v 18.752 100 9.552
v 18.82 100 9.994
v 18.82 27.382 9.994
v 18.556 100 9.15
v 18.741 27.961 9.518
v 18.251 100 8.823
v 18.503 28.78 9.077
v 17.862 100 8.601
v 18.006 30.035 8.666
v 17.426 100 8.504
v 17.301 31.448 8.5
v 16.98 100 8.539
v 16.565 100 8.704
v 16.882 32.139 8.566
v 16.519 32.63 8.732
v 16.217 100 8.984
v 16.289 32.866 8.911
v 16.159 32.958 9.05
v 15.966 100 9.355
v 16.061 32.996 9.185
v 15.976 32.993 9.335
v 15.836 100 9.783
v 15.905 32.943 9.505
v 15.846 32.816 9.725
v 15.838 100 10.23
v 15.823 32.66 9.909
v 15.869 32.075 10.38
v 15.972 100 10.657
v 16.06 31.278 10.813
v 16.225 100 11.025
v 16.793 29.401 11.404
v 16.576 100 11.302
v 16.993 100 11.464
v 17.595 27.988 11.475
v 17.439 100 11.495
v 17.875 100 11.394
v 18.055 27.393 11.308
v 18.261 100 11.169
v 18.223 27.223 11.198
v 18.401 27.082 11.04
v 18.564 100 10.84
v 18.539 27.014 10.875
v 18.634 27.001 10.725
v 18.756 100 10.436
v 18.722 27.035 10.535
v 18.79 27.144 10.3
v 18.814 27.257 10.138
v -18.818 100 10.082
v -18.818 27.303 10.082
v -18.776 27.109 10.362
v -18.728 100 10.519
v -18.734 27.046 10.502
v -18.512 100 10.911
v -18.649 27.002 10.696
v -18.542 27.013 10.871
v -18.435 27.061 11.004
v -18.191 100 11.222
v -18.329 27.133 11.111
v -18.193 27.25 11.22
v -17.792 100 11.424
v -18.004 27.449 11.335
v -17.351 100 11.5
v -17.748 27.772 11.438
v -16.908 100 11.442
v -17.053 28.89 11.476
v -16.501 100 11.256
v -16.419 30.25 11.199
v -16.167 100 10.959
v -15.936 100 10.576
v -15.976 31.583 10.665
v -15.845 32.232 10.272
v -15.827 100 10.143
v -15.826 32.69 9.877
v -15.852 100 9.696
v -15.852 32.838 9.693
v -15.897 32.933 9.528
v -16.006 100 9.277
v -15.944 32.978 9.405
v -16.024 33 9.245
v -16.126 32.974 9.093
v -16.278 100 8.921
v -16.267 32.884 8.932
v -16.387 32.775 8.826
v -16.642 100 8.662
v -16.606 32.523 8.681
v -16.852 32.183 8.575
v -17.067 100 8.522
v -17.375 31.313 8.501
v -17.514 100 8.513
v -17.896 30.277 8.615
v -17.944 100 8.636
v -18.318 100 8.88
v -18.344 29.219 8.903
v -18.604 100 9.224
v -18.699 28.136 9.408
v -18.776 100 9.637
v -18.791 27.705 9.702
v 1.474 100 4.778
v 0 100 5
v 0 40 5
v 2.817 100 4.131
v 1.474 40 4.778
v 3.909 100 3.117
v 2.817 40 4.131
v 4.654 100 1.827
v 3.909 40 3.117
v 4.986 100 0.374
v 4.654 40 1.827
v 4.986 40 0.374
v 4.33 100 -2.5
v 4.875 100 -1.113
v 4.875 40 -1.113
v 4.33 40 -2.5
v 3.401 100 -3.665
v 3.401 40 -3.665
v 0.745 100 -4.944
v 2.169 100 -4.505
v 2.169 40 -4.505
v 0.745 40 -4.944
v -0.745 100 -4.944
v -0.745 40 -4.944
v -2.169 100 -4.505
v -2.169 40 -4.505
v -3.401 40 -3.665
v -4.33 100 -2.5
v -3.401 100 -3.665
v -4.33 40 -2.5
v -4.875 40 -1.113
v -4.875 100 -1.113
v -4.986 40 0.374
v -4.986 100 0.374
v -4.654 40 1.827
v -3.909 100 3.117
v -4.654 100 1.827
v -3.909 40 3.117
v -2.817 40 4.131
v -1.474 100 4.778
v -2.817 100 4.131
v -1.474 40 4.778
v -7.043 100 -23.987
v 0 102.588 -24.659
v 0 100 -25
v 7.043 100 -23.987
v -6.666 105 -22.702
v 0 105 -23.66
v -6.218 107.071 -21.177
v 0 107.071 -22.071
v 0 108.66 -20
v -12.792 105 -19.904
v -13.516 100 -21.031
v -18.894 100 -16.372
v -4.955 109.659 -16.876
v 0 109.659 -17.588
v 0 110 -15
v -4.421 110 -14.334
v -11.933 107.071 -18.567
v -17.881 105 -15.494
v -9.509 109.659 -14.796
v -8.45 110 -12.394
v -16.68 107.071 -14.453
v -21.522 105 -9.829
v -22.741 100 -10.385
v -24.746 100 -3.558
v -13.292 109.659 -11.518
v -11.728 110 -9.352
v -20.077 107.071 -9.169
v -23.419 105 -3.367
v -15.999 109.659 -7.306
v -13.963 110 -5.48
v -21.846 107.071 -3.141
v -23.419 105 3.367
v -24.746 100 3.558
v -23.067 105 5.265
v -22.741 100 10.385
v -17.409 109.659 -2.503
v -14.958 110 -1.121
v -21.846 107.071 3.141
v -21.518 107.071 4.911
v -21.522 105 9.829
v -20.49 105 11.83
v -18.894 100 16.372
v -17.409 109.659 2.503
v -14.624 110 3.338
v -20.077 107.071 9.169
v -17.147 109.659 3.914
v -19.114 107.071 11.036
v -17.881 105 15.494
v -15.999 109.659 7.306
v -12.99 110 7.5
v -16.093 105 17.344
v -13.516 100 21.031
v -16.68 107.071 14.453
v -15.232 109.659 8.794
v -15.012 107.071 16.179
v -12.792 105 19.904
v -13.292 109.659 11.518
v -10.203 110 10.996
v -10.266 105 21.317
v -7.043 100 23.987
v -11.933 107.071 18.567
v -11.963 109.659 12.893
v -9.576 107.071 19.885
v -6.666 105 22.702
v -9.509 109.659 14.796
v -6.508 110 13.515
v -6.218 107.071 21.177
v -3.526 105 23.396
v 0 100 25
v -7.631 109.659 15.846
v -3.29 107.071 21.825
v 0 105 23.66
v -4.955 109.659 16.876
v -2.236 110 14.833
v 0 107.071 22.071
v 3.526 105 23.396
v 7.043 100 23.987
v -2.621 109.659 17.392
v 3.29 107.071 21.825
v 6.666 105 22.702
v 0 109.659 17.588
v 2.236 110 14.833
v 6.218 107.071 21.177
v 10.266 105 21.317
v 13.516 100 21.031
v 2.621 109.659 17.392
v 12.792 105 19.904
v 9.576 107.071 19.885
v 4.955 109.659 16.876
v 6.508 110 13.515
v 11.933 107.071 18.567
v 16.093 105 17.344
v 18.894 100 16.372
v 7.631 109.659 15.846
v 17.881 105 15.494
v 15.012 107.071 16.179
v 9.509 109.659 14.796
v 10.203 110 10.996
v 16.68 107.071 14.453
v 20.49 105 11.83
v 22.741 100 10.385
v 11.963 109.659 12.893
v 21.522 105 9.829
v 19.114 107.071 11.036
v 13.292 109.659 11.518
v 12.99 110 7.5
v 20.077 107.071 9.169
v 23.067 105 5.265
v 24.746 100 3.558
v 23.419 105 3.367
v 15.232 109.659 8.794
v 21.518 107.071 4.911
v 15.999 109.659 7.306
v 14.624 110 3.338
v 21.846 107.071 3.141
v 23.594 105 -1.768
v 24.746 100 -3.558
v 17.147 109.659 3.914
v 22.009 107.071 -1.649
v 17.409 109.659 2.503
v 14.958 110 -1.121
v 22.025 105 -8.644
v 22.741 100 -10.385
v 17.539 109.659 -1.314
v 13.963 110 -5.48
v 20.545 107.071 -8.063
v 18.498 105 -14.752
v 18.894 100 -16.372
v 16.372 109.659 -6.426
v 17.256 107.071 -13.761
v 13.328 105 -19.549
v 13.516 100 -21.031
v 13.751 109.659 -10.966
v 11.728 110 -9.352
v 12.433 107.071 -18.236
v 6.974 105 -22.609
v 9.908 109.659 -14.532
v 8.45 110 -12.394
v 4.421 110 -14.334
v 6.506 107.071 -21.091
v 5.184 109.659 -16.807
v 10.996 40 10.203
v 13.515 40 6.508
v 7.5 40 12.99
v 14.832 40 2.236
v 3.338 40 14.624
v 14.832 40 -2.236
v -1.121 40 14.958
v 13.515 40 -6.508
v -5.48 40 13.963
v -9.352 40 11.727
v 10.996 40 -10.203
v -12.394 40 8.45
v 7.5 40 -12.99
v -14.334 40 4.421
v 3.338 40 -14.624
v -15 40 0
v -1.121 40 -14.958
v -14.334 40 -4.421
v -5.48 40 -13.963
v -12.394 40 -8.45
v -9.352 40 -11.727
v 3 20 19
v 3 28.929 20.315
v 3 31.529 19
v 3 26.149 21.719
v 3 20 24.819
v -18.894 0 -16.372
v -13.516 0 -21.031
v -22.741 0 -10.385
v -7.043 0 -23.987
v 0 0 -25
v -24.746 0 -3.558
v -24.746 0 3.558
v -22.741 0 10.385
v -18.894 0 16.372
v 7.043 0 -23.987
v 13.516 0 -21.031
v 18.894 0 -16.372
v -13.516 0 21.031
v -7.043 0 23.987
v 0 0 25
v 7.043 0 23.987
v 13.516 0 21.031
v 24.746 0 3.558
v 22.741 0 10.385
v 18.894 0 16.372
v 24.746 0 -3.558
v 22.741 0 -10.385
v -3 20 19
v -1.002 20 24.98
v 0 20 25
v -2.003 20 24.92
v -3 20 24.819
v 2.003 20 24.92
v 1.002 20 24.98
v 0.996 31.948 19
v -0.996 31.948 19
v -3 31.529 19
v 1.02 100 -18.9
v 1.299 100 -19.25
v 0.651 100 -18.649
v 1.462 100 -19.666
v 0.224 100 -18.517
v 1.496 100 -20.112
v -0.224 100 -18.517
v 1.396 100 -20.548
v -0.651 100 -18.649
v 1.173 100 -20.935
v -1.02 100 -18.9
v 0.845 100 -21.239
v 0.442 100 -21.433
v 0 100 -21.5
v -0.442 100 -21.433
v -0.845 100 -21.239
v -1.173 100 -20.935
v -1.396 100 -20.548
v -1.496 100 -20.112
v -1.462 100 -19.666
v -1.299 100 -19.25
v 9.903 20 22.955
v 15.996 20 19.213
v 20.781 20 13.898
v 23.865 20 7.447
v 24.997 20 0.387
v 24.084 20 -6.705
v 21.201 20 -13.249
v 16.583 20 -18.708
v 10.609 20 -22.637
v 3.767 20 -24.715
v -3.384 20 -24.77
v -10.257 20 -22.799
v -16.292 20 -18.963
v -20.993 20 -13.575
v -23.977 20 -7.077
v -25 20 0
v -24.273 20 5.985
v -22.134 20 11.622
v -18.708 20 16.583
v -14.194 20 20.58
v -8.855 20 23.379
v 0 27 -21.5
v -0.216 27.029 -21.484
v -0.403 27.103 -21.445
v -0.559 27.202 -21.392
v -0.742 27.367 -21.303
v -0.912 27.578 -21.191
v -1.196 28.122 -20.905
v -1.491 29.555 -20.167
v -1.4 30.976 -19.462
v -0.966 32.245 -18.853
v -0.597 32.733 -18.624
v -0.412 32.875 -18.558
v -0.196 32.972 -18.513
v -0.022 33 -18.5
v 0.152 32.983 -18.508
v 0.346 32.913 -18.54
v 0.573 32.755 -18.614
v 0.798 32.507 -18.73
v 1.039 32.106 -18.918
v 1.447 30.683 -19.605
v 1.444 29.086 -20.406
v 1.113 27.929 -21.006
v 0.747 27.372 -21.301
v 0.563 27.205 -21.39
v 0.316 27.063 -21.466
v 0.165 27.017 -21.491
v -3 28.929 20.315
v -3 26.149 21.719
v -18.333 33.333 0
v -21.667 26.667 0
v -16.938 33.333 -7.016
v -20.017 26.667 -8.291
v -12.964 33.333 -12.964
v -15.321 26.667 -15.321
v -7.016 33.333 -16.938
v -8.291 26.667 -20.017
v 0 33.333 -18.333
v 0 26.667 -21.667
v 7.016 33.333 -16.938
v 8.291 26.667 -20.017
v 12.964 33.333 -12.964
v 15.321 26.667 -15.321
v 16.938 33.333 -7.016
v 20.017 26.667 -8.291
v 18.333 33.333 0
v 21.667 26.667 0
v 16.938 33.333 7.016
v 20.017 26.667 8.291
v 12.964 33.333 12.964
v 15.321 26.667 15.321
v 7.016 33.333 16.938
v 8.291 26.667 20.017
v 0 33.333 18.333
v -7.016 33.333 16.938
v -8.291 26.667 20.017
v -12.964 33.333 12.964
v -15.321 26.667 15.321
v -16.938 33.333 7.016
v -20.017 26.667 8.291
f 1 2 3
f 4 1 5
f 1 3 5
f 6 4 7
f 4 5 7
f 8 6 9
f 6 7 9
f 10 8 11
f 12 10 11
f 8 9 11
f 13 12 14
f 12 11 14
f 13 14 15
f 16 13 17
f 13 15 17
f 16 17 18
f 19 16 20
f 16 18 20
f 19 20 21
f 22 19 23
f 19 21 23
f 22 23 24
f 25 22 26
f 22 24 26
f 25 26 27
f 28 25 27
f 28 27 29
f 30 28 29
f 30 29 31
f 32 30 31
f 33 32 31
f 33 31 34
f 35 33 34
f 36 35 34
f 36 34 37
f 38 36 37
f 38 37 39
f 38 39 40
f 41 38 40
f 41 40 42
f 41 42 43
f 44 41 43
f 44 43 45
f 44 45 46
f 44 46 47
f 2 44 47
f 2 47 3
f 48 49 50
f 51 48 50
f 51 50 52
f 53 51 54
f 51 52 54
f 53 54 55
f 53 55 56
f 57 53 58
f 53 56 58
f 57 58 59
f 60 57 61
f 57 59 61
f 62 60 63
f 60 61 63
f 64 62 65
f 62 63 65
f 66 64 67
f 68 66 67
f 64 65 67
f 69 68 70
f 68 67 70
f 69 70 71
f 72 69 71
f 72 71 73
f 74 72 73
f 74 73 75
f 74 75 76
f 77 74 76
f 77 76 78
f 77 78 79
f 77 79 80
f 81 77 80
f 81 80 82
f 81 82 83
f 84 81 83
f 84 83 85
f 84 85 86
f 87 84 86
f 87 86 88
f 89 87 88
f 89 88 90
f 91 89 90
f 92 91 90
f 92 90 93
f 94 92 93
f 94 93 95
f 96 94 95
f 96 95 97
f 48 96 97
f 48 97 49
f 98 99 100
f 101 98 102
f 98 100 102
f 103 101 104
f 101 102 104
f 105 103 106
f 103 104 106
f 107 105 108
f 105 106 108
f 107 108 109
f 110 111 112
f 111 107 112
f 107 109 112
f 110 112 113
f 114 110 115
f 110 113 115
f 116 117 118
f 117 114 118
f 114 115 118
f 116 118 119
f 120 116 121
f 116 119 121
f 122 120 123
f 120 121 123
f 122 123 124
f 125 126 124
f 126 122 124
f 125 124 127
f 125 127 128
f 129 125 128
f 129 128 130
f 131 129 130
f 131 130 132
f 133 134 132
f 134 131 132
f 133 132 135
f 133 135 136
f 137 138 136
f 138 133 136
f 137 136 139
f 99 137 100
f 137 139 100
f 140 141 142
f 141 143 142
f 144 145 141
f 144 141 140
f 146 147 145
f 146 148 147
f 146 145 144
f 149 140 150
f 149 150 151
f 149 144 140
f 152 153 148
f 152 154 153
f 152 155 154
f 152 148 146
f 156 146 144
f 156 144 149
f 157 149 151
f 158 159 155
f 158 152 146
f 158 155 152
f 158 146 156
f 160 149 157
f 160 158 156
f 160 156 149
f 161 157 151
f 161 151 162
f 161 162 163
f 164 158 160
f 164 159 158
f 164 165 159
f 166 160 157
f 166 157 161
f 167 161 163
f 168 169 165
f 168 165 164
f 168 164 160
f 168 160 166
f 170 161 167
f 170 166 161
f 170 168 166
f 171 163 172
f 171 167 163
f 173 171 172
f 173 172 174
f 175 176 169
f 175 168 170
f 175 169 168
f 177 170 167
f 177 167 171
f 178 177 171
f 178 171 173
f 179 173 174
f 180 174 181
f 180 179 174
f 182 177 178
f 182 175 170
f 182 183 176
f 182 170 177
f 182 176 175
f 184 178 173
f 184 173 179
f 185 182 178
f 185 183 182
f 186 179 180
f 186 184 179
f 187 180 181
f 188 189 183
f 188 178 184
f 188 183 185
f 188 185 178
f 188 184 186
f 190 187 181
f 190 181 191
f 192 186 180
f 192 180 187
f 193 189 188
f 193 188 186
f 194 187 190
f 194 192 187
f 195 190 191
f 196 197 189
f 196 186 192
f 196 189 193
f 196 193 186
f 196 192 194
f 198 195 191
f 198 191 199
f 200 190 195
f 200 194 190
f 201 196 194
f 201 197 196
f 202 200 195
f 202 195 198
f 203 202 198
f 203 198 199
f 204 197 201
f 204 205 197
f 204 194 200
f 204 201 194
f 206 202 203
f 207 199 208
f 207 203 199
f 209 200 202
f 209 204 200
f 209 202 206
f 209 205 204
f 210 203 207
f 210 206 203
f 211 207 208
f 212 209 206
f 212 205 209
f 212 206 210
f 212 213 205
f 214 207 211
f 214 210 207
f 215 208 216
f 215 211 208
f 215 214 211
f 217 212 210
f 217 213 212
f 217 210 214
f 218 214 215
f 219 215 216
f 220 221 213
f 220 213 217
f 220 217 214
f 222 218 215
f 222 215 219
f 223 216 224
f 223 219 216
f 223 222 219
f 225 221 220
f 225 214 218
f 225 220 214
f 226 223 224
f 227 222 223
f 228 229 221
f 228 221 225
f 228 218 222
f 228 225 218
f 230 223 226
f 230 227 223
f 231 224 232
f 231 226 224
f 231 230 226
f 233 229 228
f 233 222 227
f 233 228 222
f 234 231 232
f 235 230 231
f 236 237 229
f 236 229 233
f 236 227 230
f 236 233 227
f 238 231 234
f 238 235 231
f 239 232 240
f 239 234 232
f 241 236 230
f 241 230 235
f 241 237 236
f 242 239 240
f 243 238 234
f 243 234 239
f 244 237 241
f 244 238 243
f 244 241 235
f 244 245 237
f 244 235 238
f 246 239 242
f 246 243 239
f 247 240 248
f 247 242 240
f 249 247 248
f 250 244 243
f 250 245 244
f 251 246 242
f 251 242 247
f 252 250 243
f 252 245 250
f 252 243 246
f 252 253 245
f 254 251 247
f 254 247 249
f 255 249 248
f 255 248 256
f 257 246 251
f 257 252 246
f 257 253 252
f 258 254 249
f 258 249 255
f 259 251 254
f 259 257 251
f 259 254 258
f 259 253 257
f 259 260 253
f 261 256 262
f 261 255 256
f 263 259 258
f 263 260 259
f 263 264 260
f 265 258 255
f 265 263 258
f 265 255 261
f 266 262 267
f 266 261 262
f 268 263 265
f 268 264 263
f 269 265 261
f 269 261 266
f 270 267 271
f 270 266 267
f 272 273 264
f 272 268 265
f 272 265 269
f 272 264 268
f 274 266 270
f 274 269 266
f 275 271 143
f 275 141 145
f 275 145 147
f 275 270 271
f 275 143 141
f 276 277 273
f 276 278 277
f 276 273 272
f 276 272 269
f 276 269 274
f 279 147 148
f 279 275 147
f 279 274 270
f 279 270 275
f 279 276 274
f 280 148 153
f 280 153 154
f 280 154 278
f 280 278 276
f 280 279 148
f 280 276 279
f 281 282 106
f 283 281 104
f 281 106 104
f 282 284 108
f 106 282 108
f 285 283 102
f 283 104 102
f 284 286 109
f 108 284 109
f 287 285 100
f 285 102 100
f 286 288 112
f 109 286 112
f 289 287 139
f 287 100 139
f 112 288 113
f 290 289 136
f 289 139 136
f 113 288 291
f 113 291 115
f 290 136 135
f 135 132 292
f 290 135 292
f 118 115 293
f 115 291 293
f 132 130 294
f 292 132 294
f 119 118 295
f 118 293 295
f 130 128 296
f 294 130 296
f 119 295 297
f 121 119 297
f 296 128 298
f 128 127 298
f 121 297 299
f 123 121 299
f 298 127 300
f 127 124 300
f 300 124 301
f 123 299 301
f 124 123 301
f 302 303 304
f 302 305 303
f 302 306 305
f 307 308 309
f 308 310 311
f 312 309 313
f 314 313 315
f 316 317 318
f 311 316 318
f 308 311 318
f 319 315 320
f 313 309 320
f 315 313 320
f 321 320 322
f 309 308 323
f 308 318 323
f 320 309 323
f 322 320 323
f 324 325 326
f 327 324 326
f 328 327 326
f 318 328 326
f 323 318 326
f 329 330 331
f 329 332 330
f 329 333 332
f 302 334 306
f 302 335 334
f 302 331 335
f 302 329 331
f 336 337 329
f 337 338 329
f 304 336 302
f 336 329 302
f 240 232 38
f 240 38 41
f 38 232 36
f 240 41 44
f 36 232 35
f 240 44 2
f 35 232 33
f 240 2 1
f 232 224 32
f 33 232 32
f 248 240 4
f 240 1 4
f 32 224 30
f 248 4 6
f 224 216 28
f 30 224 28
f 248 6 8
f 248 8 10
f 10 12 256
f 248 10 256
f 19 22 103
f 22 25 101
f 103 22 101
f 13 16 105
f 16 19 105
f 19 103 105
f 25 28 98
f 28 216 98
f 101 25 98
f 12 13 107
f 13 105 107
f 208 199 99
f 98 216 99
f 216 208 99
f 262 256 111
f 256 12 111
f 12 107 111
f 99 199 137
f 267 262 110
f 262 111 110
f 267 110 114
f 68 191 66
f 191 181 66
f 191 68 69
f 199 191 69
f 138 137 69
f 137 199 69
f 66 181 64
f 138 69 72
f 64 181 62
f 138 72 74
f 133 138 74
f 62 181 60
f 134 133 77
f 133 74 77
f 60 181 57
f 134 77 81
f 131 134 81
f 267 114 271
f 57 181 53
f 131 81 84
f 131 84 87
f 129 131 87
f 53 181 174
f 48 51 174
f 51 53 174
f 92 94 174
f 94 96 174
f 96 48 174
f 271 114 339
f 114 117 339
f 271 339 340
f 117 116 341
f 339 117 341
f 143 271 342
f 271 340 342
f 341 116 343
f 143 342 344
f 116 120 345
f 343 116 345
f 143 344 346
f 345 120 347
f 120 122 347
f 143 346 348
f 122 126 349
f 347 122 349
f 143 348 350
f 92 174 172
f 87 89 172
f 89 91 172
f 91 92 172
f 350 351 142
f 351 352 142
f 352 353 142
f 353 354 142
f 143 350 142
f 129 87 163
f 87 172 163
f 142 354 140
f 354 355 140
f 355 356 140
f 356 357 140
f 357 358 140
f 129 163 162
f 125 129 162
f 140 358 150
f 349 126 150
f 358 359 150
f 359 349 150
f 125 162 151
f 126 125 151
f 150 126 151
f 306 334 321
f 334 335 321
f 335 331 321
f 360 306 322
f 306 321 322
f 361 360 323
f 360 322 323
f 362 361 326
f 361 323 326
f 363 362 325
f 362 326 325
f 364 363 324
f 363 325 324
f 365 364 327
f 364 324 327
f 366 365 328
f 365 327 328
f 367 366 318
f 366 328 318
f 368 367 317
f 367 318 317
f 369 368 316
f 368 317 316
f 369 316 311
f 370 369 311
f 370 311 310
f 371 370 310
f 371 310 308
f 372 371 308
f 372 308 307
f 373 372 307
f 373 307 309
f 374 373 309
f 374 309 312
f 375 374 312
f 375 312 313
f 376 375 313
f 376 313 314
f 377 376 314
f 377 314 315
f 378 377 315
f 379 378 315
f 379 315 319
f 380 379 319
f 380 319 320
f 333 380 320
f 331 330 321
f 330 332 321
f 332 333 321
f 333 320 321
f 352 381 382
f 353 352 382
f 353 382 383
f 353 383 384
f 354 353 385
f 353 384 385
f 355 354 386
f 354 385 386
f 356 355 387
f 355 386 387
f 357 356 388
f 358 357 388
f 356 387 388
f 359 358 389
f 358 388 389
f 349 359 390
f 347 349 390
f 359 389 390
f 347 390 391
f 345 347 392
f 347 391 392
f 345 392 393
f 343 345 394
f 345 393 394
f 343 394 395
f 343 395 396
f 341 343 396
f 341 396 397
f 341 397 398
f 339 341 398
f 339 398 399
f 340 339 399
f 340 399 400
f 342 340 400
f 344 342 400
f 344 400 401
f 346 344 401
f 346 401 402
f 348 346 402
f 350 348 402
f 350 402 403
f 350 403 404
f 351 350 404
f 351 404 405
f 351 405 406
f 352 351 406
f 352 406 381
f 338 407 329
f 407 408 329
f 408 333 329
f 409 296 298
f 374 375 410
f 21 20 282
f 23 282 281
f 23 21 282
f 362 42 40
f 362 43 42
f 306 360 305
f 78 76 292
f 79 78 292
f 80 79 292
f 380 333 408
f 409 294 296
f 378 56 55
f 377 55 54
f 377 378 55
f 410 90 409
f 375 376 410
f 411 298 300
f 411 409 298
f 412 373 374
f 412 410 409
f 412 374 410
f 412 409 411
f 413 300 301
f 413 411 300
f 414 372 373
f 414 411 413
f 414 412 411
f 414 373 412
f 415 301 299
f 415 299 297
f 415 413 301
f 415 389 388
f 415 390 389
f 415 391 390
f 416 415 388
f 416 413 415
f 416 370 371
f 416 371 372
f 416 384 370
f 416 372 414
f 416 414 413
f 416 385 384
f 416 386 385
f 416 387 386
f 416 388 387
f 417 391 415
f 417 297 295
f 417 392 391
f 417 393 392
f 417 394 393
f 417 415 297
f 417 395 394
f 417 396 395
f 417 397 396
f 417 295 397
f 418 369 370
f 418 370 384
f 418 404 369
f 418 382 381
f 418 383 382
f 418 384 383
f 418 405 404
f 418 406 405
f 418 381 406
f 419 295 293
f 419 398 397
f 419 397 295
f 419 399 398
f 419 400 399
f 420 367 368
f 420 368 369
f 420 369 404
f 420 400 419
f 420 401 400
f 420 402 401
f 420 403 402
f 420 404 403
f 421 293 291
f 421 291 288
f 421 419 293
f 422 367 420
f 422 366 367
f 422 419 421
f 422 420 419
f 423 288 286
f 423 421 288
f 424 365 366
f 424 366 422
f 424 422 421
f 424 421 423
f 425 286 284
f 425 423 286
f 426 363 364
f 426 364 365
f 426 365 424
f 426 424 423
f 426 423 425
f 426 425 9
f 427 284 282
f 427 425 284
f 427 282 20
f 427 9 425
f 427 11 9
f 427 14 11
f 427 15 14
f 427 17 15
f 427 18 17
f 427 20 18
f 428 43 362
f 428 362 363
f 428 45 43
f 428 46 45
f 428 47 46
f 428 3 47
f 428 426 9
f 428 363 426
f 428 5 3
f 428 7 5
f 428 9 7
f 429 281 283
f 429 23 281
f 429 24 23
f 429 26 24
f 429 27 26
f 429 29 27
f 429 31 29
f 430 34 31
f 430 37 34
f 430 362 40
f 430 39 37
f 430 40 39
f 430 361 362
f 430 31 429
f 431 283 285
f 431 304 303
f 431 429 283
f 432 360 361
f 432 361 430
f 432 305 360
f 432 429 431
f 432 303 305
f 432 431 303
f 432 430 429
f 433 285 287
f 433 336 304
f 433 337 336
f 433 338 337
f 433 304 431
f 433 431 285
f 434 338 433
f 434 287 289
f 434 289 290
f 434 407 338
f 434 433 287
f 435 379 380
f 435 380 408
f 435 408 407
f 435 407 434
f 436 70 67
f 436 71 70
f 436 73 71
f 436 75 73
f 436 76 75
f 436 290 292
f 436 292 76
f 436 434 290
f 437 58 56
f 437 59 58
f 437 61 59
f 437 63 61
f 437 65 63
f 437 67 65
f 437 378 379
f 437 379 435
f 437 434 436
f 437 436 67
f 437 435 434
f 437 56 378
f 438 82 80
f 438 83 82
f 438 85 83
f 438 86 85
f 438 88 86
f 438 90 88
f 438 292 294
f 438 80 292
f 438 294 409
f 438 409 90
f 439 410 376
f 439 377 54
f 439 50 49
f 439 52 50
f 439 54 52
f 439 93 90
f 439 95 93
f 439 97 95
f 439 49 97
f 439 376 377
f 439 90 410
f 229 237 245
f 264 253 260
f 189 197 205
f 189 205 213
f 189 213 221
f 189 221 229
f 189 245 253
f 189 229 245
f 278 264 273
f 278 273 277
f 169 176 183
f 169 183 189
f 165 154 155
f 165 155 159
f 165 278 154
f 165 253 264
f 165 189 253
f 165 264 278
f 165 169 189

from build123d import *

# Parameters (mm, degrees)
SKETCH1_R             = 25
BOTTOM_CYLINDER_DEPTH = 20
SKETCH3_R             = 15
SKETCH2_R             = 25
SKETCH5_R             = 1.5
UVC_RODS_DEPTH        = 80
SKETCH6_R             = 25
TOP_DEPTH             = 10
FILLET1_R             = 10
LIDAR_CUBBY_REACH     = 98.695
SKETCH8_W             = 6
SKETCH8_H             = 6
BOSS_EXTRUDE1_REACH   = 80.422
SKETCH9_R             = 5


with BuildPart() as part:
    # Sketch1 → Bottom-cylinder (new body)
    with BuildSketch(Plane(origin=(0, 0, 0), x_dir=(1, 0, 0), z_dir=(0, 1, 0))):
        with Locations(Location((0, 0, 0), (0, 0, 270))):
            Circle(SKETCH1_R)
    extrude(amount=BOTTOM_CYLINDER_DEPTH)

    # Sketch3 → Cone-top section 0
    with BuildSketch(Plane(origin=(0, 40, 0), x_dir=(-1, 0, 0), z_dir=(0, -1, 0))):
        Circle(SKETCH3_R)
    # Sketch2 → Cone-top section 1
    with BuildSketch(Plane(origin=(0, 20, 0), x_dir=(1, 0, 0), z_dir=(0, 1, 0))):
        Circle(SKETCH2_R)
    loft()

    # Sketch5 → UVC-rods (add)
    with BuildSketch(Plane(origin=(0, 20, 0), x_dir=(1, 0, 0), z_dir=(0, 1, 0))):
        with Locations(Location((0, 20, 0), (0, 0, 90.000009577))):
            Circle(SKETCH5_R)
        with Locations(Location((17.320508076, -10, 0), (0, 0, 0.247467178))):
            Circle(SKETCH5_R)
        with Locations(Location((-17.320508076, -10, 0), (0, 0, 183.11947614))):
            Circle(SKETCH5_R)
    extrude(amount=UVC_RODS_DEPTH)

    # Sketch6 → Top (add)
    with BuildSketch(Plane(origin=(0, 100, 0), x_dir=(1, 0, 0), z_dir=(0, 1, 0))):
        with Locations(Location((0, 0, 0), (0, 0, 90))):
            Circle(SKETCH6_R)
    extrude(amount=TOP_DEPTH)

    # Fillet1
    fillet1_edges = [part.edges().sort_by_distance(p)[0] for p in [
        (0, 110, 25),
    ]]
    fillet(fillet1_edges, radius=FILLET1_R - 0.0001)  # a hair under: the kernel refuses the full size

    # Lidar-cubby: up to this cone (the profile starts inside it)
    lidar_cubby_end = Plane(origin=(0, 20, 0), z_dir=(0, -1, 0)).offset(-49.999999) * Cone(1e-06, 87.0975, 174.194999, align=(Align.CENTER, Align.CENTER, Align.MIN), mode=Mode.PRIVATE)
    # Sketch8 → Lidar-cubby (cut, up to the surface)
    with BuildSketch(Plane(origin=(0, 20, 0), x_dir=(1, 0, 0), z_dir=(0, 1, 0)), mode=Mode.PRIVATE) as lidar_cubby_sk1:
        with Locations((0, -22)):
            Rectangle(SKETCH8_W, SKETCH8_H)
    lidar_cubby_tool1 = extrude(lidar_cubby_sk1.sketch, amount=LIDAR_CUBBY_REACH, mode=Mode.PRIVATE) & lidar_cubby_end
    add(lidar_cubby_tool1.solids().sort_by_distance((0, 20, 22))[0], mode=Mode.SUBTRACT)

    # Sketch9 → Boss-Extrude1 (add, up to next)
    with BuildSketch(Plane(origin=(0, 40, 0), x_dir=(1, 0, 0), z_dir=(0, 1, 0)), mode=Mode.PRIVATE) as boss_extrude1_sk1:
        with Locations(Location((0, 0, 0), (0, 0, 270))):
            Circle(SKETCH9_R)
    boss_extrude1_tool1 = extrude(boss_extrude1_sk1.sketch, amount=BOSS_EXTRUDE1_REACH, mode=Mode.PRIVATE) - part.part
    add(boss_extrude1_tool1.solids().sort_by_distance((0, 40, 0))[0])


solid = part.part
